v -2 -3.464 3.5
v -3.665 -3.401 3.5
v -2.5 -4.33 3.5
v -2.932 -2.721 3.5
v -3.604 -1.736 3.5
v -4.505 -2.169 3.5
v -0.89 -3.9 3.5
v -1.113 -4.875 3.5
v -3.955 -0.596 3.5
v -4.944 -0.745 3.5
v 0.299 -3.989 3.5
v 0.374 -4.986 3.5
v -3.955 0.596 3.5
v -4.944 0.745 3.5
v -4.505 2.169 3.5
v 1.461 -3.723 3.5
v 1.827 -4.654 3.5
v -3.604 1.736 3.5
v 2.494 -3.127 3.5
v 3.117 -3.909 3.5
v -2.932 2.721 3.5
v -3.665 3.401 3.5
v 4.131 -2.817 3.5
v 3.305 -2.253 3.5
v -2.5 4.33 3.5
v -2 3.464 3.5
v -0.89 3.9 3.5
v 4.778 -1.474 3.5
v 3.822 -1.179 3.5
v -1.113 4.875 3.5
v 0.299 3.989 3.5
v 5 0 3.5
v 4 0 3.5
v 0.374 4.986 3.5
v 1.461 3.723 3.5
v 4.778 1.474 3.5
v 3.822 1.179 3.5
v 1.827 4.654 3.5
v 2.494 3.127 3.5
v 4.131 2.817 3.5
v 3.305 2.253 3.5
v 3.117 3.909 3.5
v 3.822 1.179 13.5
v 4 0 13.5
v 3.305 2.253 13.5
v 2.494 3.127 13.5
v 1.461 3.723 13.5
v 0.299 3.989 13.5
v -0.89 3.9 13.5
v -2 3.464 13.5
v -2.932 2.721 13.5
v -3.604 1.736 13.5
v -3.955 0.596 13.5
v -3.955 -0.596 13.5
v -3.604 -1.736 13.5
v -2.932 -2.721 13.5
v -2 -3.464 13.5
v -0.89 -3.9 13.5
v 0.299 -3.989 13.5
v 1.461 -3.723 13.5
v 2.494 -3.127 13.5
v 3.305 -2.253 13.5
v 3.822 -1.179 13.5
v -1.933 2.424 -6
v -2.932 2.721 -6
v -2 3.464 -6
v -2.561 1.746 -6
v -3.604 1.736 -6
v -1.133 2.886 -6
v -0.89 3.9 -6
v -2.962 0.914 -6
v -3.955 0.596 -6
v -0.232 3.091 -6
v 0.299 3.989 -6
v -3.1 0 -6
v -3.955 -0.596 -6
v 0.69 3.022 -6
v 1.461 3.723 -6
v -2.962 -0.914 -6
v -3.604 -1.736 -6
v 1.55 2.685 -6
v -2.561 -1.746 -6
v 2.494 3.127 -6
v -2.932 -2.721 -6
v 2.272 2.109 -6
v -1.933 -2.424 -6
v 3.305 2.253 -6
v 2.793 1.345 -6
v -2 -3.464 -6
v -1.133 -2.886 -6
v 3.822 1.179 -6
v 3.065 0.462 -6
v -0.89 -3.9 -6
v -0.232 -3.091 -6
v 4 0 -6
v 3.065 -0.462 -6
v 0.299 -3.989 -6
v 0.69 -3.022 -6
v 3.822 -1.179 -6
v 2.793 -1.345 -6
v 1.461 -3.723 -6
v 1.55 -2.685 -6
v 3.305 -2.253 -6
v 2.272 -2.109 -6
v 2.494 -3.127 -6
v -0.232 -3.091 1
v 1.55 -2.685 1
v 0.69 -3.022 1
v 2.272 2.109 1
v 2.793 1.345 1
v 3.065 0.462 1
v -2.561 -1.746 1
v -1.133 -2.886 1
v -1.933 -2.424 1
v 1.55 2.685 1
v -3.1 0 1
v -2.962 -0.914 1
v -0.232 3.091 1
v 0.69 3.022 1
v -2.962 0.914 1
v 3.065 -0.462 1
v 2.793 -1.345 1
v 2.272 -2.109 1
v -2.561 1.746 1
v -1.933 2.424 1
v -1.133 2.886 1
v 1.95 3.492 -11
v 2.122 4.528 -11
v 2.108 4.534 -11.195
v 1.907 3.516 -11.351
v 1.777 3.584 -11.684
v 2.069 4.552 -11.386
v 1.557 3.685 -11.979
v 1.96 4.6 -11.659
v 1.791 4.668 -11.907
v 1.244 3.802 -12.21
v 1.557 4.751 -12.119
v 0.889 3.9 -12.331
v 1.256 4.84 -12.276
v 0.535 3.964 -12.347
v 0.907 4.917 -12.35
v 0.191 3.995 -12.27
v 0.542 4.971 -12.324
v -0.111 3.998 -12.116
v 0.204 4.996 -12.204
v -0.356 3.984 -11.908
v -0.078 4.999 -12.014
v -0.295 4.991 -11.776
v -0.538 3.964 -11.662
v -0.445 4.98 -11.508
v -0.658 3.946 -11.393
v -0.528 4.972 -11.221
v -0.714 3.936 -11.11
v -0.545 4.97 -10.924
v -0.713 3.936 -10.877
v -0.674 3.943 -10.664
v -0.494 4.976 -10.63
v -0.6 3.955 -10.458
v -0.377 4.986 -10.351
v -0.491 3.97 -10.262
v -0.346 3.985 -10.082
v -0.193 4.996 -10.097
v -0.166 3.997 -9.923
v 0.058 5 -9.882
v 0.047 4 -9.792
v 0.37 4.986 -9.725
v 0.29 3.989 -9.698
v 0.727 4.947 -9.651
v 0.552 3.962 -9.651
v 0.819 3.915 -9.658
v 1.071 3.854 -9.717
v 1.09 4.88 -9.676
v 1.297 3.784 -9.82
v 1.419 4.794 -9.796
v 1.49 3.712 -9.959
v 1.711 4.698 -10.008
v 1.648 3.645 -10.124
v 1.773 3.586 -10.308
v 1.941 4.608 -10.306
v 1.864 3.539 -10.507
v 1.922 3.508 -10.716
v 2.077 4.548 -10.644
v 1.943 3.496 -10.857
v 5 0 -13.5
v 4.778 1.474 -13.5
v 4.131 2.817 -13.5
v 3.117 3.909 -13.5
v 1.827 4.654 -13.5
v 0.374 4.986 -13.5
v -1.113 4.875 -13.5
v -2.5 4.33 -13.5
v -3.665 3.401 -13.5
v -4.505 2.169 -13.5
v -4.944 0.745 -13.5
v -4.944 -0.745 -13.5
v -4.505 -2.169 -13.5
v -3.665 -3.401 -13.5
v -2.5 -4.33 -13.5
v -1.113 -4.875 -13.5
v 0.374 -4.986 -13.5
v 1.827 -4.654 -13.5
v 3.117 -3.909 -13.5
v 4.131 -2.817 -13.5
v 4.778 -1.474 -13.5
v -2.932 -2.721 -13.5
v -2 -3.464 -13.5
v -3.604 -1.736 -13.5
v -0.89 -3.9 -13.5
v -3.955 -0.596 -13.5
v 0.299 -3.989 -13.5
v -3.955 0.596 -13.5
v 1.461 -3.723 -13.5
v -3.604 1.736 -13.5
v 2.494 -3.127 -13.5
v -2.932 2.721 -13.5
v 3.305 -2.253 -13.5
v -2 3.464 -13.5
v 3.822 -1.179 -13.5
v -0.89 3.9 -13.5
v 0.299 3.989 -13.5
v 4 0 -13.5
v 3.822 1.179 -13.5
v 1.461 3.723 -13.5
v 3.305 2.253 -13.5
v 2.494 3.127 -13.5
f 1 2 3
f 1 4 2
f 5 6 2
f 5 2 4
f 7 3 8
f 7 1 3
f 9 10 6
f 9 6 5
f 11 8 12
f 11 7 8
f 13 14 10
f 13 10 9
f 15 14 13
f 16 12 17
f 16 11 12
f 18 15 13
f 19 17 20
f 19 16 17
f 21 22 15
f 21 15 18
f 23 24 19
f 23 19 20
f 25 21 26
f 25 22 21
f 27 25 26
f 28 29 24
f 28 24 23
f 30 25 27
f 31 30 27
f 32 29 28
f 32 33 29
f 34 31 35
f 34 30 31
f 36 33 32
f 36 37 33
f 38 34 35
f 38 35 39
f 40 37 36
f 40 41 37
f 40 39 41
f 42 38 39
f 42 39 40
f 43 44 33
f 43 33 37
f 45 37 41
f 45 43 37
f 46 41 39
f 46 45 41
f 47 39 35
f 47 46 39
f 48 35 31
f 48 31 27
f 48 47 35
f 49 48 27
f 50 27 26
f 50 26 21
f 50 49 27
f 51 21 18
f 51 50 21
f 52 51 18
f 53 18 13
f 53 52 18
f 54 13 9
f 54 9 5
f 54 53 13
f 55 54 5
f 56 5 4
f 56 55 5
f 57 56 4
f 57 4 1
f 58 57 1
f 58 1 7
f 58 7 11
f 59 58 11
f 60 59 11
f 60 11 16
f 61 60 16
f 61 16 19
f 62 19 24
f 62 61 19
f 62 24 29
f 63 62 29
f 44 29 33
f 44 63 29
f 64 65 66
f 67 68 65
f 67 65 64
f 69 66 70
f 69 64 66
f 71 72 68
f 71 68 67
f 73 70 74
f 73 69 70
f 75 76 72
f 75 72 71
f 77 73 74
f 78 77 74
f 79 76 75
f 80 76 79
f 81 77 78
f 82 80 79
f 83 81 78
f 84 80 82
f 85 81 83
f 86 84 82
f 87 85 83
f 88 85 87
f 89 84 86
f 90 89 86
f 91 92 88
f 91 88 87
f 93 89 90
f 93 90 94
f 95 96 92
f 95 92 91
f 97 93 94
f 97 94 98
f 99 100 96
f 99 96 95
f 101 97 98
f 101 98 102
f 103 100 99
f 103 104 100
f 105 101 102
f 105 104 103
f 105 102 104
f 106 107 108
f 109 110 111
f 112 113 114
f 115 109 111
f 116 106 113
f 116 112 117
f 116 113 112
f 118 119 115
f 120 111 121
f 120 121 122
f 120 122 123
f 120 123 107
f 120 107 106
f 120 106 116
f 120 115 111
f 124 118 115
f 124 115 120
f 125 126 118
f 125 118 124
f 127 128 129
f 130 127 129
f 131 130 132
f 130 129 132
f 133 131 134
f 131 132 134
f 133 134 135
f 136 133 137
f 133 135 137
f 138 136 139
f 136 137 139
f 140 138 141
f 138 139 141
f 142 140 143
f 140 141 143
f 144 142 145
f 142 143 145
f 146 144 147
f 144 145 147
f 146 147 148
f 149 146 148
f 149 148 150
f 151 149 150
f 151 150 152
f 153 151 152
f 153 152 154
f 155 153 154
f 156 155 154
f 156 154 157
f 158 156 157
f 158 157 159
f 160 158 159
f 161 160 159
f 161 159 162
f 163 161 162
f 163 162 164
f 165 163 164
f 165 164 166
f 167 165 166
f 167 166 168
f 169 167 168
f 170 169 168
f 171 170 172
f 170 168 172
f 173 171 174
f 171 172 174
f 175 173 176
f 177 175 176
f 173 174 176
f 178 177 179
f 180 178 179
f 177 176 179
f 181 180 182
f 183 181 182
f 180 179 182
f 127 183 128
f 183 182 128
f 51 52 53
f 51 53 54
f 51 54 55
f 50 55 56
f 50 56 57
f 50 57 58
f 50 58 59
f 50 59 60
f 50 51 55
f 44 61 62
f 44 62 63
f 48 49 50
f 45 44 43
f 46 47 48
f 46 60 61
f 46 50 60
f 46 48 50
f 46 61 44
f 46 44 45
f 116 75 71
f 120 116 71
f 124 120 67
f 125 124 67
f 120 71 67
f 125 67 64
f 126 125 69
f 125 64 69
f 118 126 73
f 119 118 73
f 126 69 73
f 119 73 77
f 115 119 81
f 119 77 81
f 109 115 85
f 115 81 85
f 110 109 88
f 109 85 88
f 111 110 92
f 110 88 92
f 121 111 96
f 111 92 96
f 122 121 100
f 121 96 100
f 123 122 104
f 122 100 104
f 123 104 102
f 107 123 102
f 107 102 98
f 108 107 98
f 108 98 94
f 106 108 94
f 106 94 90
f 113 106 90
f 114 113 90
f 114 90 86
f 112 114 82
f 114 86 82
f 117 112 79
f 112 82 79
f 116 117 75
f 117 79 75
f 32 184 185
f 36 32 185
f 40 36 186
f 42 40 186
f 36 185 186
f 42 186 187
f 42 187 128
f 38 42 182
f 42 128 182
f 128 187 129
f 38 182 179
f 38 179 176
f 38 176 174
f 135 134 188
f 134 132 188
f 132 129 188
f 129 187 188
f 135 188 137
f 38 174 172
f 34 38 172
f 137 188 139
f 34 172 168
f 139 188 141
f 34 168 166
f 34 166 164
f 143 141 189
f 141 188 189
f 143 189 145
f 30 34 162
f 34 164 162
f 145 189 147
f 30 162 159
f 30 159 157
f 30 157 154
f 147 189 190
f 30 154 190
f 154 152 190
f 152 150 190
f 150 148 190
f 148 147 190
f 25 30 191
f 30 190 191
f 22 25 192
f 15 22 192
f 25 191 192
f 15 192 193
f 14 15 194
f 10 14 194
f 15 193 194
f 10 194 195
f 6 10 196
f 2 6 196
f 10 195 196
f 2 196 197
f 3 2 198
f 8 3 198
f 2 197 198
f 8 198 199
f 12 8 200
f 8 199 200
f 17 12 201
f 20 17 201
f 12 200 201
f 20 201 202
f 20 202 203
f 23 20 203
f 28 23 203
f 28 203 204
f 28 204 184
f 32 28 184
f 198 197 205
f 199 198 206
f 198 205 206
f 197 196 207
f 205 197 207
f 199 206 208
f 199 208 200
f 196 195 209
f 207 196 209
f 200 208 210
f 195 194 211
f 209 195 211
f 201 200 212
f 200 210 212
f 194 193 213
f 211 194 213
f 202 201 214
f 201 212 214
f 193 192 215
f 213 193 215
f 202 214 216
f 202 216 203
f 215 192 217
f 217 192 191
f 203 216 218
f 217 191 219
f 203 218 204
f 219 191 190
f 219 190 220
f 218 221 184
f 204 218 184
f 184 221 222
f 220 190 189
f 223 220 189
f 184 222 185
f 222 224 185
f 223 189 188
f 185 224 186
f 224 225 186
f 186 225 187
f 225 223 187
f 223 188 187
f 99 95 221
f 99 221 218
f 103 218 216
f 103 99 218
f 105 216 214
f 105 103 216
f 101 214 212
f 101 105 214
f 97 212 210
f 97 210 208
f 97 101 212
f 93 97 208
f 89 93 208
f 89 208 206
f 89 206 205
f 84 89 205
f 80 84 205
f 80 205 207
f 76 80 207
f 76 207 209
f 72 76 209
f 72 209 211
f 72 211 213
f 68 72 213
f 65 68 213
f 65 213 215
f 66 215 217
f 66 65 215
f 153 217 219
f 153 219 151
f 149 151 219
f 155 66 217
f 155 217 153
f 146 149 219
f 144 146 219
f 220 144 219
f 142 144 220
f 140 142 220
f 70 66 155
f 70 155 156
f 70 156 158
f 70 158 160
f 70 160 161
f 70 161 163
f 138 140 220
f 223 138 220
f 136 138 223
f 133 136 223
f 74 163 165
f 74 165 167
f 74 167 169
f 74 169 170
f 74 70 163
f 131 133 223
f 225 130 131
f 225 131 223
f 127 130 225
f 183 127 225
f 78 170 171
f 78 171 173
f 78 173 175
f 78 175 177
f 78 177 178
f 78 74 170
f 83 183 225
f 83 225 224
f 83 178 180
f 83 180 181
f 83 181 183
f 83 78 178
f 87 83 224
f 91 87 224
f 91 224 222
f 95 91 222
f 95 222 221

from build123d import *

# Parameters (mm, degrees)
BOSS_EXTRUDE1_DEPTH        = 13.5
BOSS_EXTRUDE1_DEPTH_BACK   = 13.5
SKETCH3_R                  = 5
SKETCH4_R                  = 5
SKETCH4_R_2                = 4
CUT_EXTRUDE1_DEPTH         = 10
CUT_EXTRUDE2_START         = -7.5
SKETCH5_R                  = 4
CUT_EXTRUDE2_DEPTH         = 7.5
SKETCH6_R                  = 3.1
CUT_EXTRUDE3_DEPTH         = 7
F_6_32_TAPPED_HOLE1_REACH  = 29.069
F_6_32_TAPPED_HOLE1_BORE_R = 1.35255


with BuildPart() as part:
    # Sketch3 → Boss-Extrude1 (new, two sides: drawn at the far end of the back side and taken through both)
    with BuildSketch(Plane.XY.offset(-BOSS_EXTRUDE1_DEPTH_BACK)):
        Circle(SKETCH3_R)
    extrude(amount=BOSS_EXTRUDE1_DEPTH + BOSS_EXTRUDE1_DEPTH_BACK)

    # Sketch4 → Cut-Extrude1 (cut)
    with BuildSketch(Plane.XY.offset(13.5)):
        Circle(SKETCH4_R)
        Circle(SKETCH4_R_2, mode=Mode.SUBTRACT)
    extrude(amount=-CUT_EXTRUDE1_DEPTH, mode=Mode.SUBTRACT)

    # Sketch5 → Cut-Extrude2 (cut)
    with BuildSketch(Plane(origin=(0, 0, -13.5), x_dir=(-1, 0, 0), z_dir=(0, 0, -1)).offset(CUT_EXTRUDE2_START)):
        with Locations(Location((0, 0, 0), (0, 0, 180))):
            Circle(SKETCH5_R)
    extrude(amount=CUT_EXTRUDE2_DEPTH, mode=Mode.SUBTRACT)

    # Sketch6 → Cut-Extrude3 (cut)
    with BuildSketch(Plane(origin=(0, 0, -6), x_dir=(-1, 0, 0), z_dir=(0, 0, -1))):
        Circle(SKETCH6_R)
    extrude(amount=-CUT_EXTRUDE3_DEPTH, mode=Mode.SUBTRACT)

    # #6-32 Tapped Hole1 bore (on position points) → #6-32 Tapped Hole1 (cut, up to next)
    with BuildSketch(Plane(origin=(0.817740869, 4.932676745, -11), x_dir=(0.986535349014, -0.163548173776, 0), z_dir=(0.163548173776, 0.986535349014, 0)), mode=Mode.PRIVATE) as f_6_32_tapped_hole1_sk1:
        Circle(F_6_32_TAPPED_HOLE1_BORE_R)
    f_6_32_tapped_hole1_tool1 = extrude(f_6_32_tapped_hole1_sk1.sketch, amount=-F_6_32_TAPPED_HOLE1_REACH, mode=Mode.PRIVATE) & part.part
    add(f_6_32_tapped_hole1_tool1.solids().sort_by_distance((0.817741, 4.932677, -11))[0], mode=Mode.SUBTRACT)


solid = part.part
